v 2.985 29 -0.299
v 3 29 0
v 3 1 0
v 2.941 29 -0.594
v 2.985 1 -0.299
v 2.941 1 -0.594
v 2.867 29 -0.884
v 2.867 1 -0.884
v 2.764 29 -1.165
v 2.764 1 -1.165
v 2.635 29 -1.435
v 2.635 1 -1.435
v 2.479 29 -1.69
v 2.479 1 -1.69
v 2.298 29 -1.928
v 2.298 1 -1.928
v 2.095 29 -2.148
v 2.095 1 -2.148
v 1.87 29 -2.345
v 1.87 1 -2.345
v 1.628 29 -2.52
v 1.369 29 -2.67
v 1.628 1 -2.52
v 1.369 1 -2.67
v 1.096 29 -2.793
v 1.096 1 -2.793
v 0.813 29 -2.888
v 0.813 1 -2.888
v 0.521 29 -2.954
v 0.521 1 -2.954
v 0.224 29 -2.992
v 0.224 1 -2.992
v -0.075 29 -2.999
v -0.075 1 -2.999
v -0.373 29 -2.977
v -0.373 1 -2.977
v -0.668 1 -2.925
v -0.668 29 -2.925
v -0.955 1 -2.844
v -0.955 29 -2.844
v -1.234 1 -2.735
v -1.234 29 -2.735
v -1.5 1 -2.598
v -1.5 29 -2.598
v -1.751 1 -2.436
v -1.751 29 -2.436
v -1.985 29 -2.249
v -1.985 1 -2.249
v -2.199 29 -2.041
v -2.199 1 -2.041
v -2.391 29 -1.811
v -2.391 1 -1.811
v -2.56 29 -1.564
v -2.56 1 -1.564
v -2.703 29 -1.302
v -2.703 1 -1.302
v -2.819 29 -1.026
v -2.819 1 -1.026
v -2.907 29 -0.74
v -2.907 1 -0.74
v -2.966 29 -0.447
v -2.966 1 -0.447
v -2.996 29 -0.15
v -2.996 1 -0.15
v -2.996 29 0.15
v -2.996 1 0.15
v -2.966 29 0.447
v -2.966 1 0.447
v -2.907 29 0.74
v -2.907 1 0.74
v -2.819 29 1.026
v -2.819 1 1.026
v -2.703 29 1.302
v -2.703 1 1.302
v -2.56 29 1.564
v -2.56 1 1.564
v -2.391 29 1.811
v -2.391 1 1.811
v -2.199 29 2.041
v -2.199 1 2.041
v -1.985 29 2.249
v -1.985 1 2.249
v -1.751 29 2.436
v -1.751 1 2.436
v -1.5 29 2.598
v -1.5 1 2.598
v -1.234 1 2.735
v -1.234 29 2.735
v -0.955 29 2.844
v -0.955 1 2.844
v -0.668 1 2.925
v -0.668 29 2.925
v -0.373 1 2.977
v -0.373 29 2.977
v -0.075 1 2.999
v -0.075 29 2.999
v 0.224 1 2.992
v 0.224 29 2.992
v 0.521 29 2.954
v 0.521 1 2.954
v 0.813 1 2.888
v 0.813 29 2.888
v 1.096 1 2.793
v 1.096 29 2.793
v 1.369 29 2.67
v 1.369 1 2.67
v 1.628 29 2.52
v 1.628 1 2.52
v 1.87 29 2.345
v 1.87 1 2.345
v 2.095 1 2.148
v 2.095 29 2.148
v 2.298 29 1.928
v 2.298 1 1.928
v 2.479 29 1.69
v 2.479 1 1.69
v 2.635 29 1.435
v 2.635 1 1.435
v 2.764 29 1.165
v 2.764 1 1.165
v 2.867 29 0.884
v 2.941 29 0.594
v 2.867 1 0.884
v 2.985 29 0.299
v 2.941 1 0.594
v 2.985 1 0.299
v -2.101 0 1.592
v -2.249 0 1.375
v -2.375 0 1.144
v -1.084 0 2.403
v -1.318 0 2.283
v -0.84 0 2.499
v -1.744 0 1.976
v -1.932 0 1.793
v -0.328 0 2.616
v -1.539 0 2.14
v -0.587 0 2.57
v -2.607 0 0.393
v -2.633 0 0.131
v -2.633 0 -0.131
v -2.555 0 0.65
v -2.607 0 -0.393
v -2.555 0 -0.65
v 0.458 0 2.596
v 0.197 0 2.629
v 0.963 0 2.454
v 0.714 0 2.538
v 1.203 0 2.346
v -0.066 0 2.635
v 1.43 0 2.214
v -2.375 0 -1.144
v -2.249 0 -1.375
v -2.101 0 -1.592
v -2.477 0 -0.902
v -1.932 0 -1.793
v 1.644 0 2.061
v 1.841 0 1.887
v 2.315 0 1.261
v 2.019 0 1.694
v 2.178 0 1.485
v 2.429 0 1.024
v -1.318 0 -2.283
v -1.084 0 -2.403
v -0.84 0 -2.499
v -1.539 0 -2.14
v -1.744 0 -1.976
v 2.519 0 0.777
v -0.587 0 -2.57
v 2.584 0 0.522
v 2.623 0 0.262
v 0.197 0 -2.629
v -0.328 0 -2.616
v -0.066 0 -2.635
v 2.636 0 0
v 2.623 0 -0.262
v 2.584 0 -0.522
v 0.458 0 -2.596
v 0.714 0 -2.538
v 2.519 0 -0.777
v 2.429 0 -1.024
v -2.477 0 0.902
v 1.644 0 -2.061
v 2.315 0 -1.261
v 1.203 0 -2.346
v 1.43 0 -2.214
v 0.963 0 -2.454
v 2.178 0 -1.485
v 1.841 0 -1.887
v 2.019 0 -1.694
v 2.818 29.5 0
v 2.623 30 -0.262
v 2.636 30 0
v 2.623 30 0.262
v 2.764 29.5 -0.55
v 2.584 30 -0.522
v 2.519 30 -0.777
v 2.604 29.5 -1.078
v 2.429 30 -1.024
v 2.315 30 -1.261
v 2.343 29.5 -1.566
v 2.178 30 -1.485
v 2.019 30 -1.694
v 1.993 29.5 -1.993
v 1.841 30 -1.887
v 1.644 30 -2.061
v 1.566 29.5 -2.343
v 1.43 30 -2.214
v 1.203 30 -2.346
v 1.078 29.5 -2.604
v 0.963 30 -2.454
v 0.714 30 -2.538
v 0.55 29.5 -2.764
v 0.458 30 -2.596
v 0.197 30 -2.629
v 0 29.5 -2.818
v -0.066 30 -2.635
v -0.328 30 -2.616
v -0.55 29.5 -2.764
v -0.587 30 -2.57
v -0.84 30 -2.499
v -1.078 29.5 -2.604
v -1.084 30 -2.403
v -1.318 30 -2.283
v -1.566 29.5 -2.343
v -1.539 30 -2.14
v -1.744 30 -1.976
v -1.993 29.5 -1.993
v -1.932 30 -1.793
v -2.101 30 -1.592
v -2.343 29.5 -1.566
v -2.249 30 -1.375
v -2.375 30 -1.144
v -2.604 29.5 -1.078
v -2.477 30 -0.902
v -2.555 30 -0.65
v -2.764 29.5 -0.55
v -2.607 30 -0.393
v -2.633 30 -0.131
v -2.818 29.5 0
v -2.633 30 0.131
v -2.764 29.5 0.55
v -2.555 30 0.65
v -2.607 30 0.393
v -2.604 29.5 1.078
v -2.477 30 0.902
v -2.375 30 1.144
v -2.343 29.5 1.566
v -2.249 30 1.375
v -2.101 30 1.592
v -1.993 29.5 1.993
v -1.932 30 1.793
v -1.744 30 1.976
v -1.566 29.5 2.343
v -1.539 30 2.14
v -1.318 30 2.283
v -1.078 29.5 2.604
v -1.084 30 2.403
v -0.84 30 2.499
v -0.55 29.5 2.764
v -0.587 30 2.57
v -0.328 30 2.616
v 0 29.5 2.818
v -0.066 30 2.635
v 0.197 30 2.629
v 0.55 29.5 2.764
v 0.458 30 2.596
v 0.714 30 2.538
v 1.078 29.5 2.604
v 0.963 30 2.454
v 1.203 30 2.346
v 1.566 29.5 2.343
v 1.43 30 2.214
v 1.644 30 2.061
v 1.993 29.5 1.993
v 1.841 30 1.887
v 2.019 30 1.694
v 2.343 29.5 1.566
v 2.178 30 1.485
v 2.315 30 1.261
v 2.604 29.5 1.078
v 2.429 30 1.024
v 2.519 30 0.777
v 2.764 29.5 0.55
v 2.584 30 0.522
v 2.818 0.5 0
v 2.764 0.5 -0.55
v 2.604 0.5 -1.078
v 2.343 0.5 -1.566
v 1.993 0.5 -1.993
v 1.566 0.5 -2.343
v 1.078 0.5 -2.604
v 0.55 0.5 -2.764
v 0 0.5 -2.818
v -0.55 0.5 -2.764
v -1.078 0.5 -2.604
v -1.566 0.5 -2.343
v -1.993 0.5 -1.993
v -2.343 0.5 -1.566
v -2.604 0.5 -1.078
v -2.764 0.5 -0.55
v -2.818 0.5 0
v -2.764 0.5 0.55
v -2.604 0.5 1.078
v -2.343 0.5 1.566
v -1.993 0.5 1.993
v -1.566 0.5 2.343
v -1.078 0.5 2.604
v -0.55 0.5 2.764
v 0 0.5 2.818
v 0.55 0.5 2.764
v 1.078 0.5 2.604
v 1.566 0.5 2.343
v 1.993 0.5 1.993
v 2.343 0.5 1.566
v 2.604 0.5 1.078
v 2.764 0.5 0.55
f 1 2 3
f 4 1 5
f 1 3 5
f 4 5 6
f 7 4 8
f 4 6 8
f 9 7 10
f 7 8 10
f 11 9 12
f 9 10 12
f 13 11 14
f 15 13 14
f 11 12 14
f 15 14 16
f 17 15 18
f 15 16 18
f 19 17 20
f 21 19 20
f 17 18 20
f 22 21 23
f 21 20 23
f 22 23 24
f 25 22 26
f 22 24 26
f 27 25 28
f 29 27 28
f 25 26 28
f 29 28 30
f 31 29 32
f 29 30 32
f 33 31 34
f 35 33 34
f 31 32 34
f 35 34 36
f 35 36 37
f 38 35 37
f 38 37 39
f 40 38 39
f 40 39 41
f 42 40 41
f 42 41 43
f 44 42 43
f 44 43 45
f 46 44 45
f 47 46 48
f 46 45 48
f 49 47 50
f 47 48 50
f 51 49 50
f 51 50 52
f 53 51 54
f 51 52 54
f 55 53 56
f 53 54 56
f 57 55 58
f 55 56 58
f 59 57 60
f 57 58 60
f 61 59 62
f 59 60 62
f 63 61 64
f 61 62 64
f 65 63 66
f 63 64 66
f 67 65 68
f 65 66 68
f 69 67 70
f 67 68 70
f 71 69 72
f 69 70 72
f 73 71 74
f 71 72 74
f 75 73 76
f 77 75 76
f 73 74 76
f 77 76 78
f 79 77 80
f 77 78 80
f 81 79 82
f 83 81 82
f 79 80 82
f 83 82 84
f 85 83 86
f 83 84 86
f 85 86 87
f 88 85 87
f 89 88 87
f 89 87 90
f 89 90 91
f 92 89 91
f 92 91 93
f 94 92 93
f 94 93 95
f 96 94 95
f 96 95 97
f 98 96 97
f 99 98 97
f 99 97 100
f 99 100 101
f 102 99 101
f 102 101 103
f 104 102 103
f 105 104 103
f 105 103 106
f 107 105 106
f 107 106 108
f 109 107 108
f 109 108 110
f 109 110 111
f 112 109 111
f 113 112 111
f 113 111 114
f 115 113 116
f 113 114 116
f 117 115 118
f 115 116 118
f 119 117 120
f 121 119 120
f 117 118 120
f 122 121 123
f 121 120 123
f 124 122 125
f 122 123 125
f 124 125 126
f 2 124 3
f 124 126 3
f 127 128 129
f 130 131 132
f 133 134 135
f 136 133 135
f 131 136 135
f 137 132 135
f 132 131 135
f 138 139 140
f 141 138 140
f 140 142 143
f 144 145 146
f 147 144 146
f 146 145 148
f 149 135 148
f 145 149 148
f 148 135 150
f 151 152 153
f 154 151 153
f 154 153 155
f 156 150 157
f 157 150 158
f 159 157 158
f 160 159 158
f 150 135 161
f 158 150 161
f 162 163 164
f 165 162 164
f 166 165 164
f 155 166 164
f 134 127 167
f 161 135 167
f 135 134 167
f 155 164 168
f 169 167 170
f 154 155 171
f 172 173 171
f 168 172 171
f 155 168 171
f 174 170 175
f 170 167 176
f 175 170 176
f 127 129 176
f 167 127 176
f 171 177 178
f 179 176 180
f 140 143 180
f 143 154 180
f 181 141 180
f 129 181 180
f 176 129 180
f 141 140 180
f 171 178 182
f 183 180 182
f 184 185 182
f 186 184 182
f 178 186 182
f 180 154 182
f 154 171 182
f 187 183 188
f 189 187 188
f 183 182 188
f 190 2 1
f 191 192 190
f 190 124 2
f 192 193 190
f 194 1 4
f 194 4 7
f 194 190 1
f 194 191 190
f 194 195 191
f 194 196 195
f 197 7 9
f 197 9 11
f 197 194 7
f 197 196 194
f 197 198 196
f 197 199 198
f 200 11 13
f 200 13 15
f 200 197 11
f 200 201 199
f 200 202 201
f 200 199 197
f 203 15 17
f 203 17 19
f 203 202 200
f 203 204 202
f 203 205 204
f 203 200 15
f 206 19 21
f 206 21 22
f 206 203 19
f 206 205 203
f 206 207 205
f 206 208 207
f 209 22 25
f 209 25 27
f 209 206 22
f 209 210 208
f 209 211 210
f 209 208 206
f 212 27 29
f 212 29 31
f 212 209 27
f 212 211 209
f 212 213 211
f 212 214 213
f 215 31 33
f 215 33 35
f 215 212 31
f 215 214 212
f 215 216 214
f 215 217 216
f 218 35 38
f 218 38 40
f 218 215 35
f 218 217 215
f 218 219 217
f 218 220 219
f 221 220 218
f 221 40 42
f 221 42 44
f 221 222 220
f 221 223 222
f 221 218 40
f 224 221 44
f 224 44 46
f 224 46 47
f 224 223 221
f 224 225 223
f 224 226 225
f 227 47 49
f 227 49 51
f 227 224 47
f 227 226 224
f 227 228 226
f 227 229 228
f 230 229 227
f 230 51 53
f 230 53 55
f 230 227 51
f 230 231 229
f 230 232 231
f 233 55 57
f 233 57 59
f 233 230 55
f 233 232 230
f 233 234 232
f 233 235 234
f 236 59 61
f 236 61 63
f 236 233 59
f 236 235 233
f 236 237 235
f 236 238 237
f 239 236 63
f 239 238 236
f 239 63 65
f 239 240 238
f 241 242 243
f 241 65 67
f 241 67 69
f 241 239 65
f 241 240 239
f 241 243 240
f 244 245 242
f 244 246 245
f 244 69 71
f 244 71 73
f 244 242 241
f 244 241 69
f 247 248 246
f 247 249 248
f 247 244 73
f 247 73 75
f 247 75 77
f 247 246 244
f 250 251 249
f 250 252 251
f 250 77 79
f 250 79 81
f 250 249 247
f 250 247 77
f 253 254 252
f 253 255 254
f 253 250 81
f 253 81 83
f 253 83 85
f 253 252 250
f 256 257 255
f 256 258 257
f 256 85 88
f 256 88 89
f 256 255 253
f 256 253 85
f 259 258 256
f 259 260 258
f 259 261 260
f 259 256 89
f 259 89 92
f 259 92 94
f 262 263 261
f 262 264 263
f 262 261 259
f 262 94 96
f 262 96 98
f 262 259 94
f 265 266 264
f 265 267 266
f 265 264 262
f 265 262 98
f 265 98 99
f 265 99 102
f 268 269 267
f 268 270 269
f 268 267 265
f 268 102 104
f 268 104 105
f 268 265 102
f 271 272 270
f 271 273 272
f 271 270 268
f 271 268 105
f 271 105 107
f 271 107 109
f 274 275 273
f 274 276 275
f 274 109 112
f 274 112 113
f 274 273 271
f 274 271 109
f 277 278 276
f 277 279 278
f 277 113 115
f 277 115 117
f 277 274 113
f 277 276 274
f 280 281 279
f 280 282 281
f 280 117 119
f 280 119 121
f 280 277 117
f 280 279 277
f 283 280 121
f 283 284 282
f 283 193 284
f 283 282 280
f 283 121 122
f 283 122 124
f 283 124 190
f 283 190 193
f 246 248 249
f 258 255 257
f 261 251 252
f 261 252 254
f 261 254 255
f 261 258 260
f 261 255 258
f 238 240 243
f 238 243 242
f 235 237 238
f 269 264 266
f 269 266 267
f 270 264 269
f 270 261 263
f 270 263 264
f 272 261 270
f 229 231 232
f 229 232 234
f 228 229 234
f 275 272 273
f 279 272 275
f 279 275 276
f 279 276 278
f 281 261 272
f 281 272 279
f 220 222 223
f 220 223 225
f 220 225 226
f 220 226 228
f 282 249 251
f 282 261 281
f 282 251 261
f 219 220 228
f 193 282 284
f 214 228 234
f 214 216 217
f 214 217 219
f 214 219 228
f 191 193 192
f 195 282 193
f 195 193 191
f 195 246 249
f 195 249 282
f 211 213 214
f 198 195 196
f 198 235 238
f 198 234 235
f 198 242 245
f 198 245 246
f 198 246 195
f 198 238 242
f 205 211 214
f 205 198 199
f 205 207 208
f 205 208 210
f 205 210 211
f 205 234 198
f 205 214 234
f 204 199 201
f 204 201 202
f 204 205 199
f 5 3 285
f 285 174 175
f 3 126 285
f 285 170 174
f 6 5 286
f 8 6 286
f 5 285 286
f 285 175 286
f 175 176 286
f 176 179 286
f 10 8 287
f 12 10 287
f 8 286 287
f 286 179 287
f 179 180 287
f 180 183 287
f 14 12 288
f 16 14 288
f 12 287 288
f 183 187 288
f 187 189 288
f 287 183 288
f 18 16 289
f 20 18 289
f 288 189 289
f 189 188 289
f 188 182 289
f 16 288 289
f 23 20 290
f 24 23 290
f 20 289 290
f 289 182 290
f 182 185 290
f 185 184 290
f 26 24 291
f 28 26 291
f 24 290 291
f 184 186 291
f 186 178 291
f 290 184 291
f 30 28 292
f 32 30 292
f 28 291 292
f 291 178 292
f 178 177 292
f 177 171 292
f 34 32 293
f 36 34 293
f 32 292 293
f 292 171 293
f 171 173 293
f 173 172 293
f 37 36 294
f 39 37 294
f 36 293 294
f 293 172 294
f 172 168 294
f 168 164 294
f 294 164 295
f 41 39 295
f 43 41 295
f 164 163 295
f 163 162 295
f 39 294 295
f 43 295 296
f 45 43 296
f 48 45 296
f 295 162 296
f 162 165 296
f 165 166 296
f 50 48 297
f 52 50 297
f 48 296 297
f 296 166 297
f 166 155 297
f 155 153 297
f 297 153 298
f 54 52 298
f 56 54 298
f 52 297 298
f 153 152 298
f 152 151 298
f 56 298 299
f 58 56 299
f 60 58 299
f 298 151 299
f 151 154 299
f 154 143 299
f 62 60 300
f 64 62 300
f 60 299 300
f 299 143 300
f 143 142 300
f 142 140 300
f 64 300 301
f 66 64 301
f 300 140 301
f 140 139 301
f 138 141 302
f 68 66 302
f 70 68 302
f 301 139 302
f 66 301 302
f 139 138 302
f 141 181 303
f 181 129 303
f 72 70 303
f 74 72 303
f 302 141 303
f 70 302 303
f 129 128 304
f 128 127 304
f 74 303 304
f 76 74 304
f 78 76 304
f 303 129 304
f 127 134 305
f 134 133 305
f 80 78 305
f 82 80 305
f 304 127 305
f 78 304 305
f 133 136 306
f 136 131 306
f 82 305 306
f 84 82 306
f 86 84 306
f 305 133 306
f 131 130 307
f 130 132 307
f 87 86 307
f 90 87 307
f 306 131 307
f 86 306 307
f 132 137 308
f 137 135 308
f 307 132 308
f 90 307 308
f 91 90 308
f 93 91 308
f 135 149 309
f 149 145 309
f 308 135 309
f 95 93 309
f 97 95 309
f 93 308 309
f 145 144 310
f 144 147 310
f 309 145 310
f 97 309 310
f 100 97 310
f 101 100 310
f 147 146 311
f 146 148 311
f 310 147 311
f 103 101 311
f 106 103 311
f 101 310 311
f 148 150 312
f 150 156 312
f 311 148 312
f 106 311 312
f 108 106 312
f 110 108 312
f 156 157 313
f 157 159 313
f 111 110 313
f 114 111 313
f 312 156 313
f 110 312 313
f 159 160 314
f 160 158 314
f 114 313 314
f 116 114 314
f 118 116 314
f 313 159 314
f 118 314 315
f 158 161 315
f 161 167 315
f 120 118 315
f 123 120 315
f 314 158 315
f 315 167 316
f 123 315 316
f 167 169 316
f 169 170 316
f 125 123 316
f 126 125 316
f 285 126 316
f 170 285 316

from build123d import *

# Parameters (mm, degrees)
SKETCH1_R           = 3
BOSS_EXTRUDE1_DEPTH = 30
CHAMFER1_SIZE       = 1
CHAMFER1_SIZE2      = 0.363970234
CHAMFER2_SIZE       = 1
CHAMFER2_SIZE2      = 0.363970234


with BuildPart() as part:
    # Sketch1 → Boss-Extrude1 (new body)
    with BuildSketch(Plane(origin=(0, 0, 0), x_dir=(1, 0, 0), z_dir=(0, 1, 0))):
        Circle(SKETCH1_R)
    extrude(amount=BOSS_EXTRUDE1_DEPTH)

    # Chamfer1
    chamfer1_edges = [part.edges().sort_by_distance(p)[0] for p in [
        (-3, 30, 0),
    ]]
    chamfer1_side = [part.faces().sort_by_distance(p)[0] for p in [
        (-3, 15, 0),
    ]]
    chamfer(chamfer1_edges, length=CHAMFER1_SIZE, length2=CHAMFER1_SIZE2, reference=chamfer1_side[0])

    # Chamfer2
    chamfer2_edges = [part.edges().sort_by_distance(p)[0] for p in [
        (-3, 0, 0),
    ]]
    chamfer2_side = [part.faces().sort_by_distance(p)[0] for p in [
        (-3, 14.5, 0),
    ]]
    chamfer(chamfer2_edges, length=CHAMFER2_SIZE, length2=CHAMFER2_SIZE2, reference=chamfer2_side[0])


solid = part.part
